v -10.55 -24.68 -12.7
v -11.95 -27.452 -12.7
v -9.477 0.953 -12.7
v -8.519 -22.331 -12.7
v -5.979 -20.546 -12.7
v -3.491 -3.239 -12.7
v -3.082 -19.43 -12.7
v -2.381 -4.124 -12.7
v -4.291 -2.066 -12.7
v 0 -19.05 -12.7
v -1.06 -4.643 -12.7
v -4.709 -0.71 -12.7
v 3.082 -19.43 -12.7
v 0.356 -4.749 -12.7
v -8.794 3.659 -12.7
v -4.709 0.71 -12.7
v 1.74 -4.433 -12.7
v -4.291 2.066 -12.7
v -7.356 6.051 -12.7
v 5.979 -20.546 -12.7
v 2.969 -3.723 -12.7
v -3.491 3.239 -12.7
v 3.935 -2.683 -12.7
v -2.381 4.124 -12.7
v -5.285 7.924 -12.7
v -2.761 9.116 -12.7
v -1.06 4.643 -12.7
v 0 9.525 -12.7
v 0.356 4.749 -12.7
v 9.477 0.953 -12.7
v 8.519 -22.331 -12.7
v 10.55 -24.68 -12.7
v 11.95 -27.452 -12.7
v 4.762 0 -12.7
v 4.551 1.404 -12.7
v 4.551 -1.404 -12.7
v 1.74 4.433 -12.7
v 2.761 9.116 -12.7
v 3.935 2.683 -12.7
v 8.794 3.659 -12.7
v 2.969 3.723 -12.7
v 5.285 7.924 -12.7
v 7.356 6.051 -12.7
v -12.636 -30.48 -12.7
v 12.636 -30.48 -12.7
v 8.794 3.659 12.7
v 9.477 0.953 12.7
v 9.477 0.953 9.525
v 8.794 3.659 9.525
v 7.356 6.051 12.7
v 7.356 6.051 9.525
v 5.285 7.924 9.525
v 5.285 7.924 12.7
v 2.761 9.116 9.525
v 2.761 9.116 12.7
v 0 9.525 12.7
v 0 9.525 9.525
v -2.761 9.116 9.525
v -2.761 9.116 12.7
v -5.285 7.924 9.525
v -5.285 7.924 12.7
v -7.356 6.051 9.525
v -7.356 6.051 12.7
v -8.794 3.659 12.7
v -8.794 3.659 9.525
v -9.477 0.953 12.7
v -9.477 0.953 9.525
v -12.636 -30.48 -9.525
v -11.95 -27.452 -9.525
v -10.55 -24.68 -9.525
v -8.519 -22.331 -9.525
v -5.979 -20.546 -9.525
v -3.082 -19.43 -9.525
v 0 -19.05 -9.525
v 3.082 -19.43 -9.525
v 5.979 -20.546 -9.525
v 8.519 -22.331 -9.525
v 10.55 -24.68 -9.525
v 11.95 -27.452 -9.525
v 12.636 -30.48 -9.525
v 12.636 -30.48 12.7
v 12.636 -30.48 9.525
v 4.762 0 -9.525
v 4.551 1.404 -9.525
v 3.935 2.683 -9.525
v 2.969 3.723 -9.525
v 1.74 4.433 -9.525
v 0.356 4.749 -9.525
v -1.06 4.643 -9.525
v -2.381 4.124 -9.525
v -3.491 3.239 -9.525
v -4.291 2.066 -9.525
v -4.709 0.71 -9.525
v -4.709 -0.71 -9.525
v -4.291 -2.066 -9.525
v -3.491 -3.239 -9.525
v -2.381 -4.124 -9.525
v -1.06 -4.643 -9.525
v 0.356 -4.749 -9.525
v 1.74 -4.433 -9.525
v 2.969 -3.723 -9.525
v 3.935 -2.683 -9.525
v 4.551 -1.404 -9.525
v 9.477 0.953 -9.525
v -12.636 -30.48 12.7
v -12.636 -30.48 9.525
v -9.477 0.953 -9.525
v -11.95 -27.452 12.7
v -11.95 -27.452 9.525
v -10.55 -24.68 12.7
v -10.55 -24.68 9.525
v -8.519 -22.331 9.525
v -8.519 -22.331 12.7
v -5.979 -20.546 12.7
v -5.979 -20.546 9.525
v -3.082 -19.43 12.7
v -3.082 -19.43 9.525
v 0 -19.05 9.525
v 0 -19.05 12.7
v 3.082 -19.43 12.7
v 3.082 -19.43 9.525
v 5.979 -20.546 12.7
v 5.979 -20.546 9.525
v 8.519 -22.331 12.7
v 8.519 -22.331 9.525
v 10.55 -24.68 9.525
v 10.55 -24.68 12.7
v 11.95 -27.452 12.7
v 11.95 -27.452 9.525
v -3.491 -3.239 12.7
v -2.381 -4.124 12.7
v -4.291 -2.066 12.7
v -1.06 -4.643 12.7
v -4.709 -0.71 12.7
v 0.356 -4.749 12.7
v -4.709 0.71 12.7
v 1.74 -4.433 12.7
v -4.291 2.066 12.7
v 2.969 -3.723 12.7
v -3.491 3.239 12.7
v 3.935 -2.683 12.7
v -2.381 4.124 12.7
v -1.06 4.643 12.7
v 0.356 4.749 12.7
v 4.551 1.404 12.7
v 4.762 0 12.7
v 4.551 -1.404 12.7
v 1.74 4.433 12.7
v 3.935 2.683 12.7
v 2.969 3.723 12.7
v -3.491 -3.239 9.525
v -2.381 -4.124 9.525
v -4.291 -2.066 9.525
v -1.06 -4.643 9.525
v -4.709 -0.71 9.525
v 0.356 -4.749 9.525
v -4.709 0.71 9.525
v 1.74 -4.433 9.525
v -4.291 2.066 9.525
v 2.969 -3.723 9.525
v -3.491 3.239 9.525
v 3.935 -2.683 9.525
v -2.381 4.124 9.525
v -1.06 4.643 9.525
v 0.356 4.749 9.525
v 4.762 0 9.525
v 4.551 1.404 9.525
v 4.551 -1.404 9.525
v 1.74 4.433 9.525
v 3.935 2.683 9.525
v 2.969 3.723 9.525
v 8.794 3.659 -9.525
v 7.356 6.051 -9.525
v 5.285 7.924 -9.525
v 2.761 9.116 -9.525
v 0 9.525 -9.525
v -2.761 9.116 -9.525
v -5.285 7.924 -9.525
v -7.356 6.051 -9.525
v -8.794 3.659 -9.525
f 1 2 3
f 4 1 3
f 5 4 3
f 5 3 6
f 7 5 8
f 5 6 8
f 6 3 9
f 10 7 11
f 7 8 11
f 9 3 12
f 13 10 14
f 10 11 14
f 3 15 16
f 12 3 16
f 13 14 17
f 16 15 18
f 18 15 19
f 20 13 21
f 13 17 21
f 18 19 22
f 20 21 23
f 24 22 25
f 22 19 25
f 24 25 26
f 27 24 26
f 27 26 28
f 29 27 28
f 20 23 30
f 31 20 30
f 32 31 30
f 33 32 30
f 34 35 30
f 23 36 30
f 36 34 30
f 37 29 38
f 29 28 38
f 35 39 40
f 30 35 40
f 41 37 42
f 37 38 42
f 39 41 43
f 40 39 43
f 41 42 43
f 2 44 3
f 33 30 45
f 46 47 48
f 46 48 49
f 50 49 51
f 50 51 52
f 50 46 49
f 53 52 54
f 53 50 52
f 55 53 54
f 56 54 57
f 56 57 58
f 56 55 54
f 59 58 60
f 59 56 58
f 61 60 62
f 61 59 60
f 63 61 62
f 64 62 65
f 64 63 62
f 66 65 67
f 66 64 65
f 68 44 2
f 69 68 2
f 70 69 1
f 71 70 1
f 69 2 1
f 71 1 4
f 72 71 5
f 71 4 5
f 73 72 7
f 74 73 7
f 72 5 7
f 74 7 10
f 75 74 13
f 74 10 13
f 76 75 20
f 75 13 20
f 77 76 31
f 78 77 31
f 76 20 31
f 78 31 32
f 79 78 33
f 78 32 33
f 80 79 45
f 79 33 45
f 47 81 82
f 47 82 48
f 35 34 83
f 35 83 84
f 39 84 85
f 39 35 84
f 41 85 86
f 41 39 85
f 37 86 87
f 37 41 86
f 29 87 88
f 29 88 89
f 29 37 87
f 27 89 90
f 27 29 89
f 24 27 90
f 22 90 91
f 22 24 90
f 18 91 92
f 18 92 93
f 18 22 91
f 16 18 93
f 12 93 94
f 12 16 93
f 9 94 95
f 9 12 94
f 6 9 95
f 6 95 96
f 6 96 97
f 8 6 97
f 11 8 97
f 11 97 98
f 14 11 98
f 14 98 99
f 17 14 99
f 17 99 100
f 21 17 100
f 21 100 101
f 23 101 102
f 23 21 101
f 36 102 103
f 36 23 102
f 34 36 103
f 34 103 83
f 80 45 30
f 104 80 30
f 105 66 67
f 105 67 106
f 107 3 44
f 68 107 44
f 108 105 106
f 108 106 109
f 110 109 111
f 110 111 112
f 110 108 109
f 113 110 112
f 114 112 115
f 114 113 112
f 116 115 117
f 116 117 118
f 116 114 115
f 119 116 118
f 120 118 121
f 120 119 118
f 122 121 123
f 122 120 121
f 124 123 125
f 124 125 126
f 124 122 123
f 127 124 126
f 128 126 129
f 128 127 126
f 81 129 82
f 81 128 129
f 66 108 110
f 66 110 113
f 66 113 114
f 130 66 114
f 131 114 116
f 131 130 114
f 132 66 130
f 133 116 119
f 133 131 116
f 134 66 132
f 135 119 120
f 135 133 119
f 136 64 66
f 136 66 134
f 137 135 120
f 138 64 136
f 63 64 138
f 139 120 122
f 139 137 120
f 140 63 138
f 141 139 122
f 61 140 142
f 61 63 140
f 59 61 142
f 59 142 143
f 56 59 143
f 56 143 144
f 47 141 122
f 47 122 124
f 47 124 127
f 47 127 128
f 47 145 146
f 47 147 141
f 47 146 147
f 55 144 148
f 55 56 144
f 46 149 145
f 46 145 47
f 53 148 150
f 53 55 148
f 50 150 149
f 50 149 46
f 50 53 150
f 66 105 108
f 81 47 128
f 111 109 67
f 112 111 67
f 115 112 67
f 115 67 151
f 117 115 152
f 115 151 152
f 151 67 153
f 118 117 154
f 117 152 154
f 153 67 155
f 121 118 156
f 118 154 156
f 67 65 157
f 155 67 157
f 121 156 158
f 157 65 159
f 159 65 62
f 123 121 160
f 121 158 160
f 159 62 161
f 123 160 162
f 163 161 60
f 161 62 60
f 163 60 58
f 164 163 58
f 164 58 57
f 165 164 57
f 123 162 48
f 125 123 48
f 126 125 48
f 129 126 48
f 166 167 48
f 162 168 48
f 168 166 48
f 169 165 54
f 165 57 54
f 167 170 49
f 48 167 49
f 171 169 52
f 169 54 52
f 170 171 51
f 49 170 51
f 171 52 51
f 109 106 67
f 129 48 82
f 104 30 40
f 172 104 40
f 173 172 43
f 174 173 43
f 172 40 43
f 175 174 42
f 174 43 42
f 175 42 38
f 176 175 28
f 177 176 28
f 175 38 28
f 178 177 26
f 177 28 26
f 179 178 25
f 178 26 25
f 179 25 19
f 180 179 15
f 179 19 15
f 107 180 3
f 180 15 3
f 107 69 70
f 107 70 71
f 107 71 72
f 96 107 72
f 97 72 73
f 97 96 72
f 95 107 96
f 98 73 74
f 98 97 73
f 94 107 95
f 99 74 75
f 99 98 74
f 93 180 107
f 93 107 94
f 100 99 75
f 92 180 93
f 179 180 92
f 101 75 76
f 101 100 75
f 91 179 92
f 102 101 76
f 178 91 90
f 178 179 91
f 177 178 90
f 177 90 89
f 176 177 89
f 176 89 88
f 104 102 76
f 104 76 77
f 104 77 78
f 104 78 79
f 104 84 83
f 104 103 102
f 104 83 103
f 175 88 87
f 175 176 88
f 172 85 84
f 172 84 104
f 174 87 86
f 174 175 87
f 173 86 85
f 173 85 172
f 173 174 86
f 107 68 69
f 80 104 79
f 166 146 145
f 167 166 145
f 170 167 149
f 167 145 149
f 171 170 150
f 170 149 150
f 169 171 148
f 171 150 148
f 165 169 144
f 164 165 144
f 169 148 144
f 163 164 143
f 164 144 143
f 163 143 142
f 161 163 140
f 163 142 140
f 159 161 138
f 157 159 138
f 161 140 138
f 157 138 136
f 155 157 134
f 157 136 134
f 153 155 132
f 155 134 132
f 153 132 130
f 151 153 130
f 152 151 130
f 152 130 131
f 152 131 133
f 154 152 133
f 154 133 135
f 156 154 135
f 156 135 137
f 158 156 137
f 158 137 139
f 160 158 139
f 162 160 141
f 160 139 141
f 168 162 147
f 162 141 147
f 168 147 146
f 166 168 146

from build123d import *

# Parameters (mm, degrees)
BOSS_EXTRUDE1_START = 12.7
SKETCH1_R           = 4.7625
BOSS_EXTRUDE1_DEPTH = 3.175
BOSS_EXTRUDE2_START = -12.7
SKETCH1_4_R         = 4.7625
BOSS_EXTRUDE2_DEPTH = 3.175


with BuildPart() as part:
    # Sketch1 → Boss-Extrude1 (new body)
    with BuildSketch(Plane.XY.offset(BOSS_EXTRUDE1_START)):
        with BuildLine():
            ThreePointArc((9.477255338, 0.9525), (0, 9.525), (-9.477255338, 0.9525))
            Line((-9.477255338, 0.9525), (-12.636340451, -30.48))
            ThreePointArc((-12.636340451, -30.48), (0, -19.05), (12.636340451, -30.48))
            Line((12.636340451, -30.48), (9.477255338, 0.9525))
        make_face()
        Circle(SKETCH1_R, mode=Mode.SUBTRACT)
    extrude(amount=-BOSS_EXTRUDE1_DEPTH)


with BuildPart() as body_2:
    # Sketch1<4> → Boss-Extrude2 (new body)
    with BuildSketch(Plane.XY.offset(BOSS_EXTRUDE2_START)):
        with BuildLine():
            ThreePointArc((9.477255338, 0.9525), (0, 9.525), (-9.477255338, 0.9525))
            Line((-9.477255338, 0.9525), (-12.636340451, -30.48))
            ThreePointArc((-12.636340451, -30.48), (0, -19.05), (12.636340451, -30.48))
            Line((12.636340451, -30.48), (9.477255338, 0.9525))
        make_face()
        Circle(SKETCH1_4_R, mode=Mode.SUBTRACT)
    extrude(amount=BOSS_EXTRUDE2_DEPTH)


solid = Compound([part.part, body_2.part])
